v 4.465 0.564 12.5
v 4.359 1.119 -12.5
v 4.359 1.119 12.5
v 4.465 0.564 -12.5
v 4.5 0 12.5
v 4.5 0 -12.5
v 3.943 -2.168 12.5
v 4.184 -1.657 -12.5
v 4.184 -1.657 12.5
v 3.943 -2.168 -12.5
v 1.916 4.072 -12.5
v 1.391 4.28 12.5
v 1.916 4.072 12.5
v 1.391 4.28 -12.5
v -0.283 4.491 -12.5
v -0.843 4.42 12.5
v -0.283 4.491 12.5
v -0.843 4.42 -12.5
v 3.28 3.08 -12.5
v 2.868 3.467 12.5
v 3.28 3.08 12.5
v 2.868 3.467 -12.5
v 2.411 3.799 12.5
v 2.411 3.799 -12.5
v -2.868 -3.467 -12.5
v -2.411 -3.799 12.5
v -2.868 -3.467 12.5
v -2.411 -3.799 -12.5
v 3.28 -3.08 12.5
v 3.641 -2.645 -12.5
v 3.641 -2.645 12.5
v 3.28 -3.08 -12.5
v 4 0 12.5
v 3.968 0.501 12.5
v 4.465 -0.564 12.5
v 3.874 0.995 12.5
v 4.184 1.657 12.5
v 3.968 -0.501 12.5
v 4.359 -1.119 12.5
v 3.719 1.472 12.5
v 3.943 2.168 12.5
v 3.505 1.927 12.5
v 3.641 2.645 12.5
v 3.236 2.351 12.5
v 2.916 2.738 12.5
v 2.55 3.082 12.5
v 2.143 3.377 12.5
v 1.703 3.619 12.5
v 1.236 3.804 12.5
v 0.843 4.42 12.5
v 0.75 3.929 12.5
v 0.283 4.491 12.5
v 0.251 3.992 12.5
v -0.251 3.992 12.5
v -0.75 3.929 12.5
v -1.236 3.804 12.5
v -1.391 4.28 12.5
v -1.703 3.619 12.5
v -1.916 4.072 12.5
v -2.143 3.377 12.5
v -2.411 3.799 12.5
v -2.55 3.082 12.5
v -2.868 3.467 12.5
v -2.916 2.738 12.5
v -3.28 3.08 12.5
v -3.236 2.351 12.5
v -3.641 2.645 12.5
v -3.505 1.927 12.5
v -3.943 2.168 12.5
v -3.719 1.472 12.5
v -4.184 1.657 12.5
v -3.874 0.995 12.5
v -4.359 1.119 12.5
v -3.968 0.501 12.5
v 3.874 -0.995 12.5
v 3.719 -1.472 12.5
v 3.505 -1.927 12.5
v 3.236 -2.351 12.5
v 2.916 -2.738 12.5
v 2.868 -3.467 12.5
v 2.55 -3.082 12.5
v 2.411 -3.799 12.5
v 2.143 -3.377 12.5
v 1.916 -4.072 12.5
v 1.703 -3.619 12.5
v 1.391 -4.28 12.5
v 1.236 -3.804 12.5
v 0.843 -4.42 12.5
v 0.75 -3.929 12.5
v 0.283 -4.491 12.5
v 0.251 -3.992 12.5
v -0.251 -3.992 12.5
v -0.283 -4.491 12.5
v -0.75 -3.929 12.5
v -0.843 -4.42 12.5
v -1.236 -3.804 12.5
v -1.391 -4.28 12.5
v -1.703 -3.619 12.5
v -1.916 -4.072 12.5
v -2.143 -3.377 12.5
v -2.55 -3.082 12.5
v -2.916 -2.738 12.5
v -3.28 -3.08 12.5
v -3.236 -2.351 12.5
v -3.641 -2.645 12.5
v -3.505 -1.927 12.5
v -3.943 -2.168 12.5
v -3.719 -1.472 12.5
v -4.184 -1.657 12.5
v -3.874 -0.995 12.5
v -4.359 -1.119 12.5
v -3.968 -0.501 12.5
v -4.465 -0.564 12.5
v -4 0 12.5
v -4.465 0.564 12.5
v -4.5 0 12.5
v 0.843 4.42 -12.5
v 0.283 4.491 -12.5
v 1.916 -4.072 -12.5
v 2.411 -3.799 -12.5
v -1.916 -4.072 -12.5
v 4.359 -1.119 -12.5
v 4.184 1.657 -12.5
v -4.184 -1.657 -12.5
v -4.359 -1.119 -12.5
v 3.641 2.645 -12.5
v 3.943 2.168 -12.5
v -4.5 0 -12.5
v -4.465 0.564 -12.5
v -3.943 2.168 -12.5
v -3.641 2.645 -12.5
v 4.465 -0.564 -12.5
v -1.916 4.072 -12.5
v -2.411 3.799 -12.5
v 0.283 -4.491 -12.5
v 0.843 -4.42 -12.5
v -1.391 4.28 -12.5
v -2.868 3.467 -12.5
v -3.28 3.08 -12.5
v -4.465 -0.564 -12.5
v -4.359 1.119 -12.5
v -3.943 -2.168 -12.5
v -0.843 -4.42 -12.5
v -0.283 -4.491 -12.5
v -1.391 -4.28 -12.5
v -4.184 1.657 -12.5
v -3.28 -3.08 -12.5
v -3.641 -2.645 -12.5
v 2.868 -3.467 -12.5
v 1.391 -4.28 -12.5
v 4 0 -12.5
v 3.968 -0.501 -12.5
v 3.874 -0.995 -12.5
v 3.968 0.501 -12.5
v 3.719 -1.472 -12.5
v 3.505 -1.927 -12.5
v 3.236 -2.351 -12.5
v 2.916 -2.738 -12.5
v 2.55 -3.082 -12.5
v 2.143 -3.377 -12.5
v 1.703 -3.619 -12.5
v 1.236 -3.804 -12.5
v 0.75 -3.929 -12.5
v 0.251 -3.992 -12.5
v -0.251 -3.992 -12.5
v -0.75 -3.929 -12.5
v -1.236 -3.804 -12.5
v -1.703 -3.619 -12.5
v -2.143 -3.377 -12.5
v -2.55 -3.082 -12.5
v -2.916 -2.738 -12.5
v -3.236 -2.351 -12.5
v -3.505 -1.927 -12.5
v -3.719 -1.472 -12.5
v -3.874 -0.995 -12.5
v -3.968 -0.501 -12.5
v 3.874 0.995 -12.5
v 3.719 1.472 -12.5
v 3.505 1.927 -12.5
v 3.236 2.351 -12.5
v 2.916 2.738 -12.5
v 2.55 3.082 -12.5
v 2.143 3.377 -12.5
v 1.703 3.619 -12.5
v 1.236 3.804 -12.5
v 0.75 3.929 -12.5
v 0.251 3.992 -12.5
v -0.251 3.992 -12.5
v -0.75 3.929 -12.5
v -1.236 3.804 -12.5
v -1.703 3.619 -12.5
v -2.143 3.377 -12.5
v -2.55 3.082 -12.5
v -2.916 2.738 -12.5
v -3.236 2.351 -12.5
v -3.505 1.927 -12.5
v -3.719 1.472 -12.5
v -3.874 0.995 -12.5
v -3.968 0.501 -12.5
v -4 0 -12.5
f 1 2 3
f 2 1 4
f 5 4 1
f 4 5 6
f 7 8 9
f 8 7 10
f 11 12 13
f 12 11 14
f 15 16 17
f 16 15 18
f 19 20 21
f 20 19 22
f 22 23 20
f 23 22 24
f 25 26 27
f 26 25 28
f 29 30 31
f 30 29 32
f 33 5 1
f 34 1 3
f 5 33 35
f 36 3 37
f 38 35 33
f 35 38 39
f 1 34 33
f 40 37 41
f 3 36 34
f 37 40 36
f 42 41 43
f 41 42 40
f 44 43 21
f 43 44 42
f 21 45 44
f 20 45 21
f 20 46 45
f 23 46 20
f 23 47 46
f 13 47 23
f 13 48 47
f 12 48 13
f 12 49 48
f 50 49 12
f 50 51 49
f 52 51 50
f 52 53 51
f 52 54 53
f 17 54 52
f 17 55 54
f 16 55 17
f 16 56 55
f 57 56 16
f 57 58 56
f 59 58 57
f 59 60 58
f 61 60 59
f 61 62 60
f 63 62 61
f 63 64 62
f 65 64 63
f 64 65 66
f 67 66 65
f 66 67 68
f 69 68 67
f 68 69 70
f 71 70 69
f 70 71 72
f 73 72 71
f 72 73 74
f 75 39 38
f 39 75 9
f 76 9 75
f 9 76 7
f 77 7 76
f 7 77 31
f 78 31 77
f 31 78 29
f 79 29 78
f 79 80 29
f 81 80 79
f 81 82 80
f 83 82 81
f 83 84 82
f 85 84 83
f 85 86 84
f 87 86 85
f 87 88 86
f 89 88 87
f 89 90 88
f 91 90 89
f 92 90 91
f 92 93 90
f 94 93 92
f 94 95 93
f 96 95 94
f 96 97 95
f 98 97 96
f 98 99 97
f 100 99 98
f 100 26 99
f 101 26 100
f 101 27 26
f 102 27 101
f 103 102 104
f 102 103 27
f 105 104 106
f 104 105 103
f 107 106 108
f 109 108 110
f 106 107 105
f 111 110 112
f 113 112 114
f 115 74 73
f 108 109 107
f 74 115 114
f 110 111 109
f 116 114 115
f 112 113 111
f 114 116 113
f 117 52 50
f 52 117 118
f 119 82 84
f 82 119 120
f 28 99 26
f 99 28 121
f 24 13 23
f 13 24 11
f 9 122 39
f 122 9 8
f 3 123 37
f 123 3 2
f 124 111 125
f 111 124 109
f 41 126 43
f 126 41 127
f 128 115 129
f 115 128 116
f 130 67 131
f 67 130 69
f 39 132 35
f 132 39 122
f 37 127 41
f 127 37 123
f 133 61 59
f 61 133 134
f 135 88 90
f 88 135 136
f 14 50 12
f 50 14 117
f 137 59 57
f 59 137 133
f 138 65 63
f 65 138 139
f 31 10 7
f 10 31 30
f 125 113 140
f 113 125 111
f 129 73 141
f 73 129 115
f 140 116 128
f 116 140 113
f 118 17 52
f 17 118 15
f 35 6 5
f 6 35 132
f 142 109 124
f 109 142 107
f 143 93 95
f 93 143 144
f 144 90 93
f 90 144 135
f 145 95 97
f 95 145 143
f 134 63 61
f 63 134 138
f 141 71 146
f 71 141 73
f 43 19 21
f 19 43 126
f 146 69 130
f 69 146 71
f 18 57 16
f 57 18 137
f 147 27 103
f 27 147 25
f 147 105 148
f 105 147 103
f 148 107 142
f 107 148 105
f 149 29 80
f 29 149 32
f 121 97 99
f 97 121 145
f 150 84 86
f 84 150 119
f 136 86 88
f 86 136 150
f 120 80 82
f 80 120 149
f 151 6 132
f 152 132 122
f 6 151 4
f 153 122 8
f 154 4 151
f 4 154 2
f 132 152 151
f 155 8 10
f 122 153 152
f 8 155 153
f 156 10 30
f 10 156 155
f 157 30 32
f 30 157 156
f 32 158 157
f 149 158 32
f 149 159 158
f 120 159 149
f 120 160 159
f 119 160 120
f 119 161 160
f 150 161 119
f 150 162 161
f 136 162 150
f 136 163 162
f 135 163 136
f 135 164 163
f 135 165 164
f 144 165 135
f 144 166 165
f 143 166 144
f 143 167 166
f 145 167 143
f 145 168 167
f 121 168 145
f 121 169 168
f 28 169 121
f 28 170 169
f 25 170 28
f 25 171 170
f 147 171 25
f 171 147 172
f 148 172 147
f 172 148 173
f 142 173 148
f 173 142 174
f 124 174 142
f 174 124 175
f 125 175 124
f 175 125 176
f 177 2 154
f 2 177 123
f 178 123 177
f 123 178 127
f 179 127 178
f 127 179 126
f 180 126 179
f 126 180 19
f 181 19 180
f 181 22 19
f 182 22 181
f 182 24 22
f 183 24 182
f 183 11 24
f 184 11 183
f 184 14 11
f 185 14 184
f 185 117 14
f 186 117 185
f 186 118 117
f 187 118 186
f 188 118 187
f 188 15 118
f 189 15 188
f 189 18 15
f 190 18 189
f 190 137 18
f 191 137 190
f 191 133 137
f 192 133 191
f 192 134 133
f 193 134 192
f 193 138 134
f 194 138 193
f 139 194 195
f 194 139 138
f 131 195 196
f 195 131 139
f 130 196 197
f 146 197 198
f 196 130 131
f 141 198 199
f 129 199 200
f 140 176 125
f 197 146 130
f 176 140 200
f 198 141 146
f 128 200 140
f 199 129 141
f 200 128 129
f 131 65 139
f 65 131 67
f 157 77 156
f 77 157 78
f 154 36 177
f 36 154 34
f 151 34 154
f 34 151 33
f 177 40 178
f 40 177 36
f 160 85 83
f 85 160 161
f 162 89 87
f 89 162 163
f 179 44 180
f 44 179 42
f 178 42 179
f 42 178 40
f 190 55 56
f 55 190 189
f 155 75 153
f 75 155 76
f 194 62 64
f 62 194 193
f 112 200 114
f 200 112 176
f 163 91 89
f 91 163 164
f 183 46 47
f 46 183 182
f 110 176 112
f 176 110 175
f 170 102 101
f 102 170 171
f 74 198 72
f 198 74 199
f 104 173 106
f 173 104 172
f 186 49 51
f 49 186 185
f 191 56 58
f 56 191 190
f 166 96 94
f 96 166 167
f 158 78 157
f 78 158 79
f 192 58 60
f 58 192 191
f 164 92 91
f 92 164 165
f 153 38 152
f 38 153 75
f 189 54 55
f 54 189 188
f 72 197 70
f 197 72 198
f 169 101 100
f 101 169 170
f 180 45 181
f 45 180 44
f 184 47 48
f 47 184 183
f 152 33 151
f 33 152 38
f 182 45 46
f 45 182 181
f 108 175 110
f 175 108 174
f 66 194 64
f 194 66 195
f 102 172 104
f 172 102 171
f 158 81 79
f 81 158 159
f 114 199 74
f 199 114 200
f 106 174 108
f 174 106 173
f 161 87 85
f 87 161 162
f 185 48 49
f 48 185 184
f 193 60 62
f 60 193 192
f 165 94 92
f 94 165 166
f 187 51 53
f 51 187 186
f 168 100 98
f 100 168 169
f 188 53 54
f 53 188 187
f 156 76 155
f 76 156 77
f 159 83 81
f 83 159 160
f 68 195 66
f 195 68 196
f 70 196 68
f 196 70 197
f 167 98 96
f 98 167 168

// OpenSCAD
$fn = 50;


difference() {
	union() {
		translate(v = [0, 0, -12.5000000000]) {
			cylinder(h = 25, r = 4.5000000000);
		}
	}
	union() {
		translate(v = [0, 0, -100.0000000000]) {
			cylinder(h = 200, r = 4.0000000000);
		}
	}
}
